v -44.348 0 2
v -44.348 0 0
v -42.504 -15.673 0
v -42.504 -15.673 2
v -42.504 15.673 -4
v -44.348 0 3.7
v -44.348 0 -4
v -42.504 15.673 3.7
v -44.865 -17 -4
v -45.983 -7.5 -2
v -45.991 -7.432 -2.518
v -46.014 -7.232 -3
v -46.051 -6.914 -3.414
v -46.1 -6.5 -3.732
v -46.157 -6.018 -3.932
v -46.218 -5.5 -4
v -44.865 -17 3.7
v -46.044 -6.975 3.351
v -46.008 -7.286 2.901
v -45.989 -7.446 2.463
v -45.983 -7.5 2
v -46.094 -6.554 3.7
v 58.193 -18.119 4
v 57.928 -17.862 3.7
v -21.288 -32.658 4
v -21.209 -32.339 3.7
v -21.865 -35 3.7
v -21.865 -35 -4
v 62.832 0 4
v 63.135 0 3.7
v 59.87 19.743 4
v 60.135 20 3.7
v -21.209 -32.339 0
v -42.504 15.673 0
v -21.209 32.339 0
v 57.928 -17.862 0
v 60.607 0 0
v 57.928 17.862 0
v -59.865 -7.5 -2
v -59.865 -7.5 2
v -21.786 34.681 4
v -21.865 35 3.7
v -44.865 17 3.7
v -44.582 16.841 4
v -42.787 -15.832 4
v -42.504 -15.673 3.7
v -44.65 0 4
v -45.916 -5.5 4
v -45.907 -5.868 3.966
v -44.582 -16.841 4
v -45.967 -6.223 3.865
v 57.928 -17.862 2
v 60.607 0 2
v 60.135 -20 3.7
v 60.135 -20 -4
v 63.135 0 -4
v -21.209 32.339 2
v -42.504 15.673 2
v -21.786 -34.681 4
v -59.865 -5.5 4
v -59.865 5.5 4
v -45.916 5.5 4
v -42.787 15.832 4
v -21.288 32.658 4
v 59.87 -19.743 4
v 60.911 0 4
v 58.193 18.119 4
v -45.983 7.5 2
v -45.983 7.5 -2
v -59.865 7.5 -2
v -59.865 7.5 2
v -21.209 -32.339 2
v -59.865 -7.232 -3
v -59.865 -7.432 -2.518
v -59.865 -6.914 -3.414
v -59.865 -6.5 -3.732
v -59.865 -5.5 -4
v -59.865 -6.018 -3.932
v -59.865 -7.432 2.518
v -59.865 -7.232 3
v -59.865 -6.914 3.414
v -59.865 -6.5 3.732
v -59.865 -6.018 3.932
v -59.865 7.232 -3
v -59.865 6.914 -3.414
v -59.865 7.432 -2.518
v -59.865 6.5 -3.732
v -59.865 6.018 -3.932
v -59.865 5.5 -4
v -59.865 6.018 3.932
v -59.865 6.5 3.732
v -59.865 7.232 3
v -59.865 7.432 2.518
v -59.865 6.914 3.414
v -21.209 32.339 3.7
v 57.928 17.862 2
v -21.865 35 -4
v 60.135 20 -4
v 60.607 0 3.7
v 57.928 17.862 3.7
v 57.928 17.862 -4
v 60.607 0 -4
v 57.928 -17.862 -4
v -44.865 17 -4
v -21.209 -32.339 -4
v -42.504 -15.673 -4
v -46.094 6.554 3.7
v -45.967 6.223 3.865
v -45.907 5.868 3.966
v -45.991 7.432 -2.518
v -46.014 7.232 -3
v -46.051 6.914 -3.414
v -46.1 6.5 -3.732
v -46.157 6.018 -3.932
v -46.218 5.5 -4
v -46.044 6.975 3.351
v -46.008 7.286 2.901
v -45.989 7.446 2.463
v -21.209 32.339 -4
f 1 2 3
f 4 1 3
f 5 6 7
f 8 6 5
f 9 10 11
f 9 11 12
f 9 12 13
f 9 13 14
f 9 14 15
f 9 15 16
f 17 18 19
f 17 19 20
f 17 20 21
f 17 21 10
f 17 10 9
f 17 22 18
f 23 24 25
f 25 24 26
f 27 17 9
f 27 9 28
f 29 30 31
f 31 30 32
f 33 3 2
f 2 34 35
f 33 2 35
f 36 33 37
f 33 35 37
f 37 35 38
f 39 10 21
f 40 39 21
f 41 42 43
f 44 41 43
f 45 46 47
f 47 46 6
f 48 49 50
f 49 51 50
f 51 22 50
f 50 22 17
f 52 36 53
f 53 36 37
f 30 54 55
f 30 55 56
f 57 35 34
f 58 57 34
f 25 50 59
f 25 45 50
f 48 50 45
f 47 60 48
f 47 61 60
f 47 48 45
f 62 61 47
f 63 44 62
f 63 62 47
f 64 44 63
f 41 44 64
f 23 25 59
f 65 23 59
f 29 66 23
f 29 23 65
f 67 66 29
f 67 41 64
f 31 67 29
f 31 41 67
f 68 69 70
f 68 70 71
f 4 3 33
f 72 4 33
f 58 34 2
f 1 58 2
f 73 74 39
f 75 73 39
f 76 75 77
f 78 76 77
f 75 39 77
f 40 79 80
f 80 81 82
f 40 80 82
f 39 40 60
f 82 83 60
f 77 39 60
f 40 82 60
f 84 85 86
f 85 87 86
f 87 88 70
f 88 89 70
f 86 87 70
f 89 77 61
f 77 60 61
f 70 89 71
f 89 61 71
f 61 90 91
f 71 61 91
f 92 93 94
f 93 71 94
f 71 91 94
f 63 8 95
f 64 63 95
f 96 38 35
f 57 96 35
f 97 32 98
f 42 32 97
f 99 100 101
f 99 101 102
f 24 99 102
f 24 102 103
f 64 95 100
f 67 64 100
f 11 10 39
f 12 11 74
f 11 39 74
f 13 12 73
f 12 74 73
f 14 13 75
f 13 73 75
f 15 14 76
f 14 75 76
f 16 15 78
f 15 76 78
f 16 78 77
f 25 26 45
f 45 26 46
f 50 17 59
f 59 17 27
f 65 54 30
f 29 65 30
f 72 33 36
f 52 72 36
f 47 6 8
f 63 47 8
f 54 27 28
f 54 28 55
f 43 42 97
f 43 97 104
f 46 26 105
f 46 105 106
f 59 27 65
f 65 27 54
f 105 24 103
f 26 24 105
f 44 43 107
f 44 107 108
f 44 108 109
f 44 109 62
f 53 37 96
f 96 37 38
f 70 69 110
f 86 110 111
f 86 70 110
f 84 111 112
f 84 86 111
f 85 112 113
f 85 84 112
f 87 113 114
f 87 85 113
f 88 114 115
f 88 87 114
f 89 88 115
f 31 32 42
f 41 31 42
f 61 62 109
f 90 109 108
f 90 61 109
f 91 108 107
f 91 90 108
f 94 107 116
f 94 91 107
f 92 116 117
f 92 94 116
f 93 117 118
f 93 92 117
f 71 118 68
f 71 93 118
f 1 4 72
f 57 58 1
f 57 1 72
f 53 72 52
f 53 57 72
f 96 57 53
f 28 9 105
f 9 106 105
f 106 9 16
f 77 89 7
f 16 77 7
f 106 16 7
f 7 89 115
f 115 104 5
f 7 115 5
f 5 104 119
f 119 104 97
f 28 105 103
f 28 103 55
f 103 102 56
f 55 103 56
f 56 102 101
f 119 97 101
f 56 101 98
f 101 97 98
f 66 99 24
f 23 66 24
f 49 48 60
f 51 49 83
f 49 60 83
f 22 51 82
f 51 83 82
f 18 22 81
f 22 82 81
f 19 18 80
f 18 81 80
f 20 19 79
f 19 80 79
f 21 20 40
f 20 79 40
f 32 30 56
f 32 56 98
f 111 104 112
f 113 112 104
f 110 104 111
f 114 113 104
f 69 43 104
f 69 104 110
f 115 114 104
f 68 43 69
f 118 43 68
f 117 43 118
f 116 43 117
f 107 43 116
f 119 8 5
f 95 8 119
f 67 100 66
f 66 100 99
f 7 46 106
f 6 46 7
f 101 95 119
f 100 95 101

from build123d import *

# Parameters (mm, degrees)
F1_DEPTH = 4
F2_DEPTH = 2
F5_W     = 15
F5_H     = 8
F6_DEPTH = 15
F7_R     = 2
F8_SIZE  = 0.3


with BuildPart() as f1:
    # F0 (on Top) → F1 (new body, symmetric)
    with BuildSketch(Plane.XY):
        Polygon((-44.8648623007, 17), (-46.8648623007, 0), (-44.8648623007, -17), (-21.8648623007, -35), (60.1351376993, -20), (63.1351376993, 0), (60.1351376993, 20), (-21.8648623007, 35), align=None)
        Polygon((-42.5037055669, -15.6732787773), (-44.3476207171, 0), (-42.5037055669, 15.6732787773), (-21.2091646129, 32.3385716978), (57.9278251858, 17.8622930761), (60.6071691472, 0), (57.9278251858, -17.8622930761), (-21.2091646129, -32.3385716978), align=None, mode=Mode.SUBTRACT)
    extrude(amount=F1_DEPTH, both=True)

    # F5 (on plane+point) → F6 (join)
    with BuildSketch(Plane.YZ.offset(-44.8648623007)):
        Rectangle(F5_W, F5_H)
    extrude(amount=-F6_DEPTH)

    # F7
    f7_edges = [f1.edges().sort_by_distance(p)[0] for p in [
        (-52.923686, -7.5, -4),
        (-52.923686, -7.5, 4),
        (-52.923686, 7.5, -4),
        (-52.923686, 7.5, 4),
    ]]
    fillet(f7_edges, radius=F7_R)

    # F8
    f8_edges = [f1.edges().sort_by_distance(p)[0] for p in [
        (-33.364862, -26, 4),
        (19.135138, -27.5, 4),
        (-45.423686, -12.25, 4),
        (-45.423686, 12.25, 4),
        (-33.364862, 26, 4),
        (19.135138, 27.5, 4),
        (61.635138, 10, 4),
        (61.635138, -10, 4),
        (-31.856435, -24.005925, 4),
        (-43.425663, -7.836639, 4),
        (-43.425663, 7.836639, 4),
        (-31.856435, 24.005925, 4),
        (18.35933, 25.100432, 4),
        (18.35933, -25.100432, 4),
        (59.267497, -8.931147, 4),
        (59.267497, 8.931147, 4),
    ]]
    chamfer(f8_edges, length=F8_SIZE)


with BuildPart() as f2:
    # F0 (on Top) → F2 (new body)
    with BuildSketch(Plane.XY):
        Polygon((-42.5037055669, 15.6732787773), (-44.3476207171, 0), (-42.5037055669, -15.6732787773), (-21.2091646129, -32.3385716978), (57.9278251858, -17.8622930761), (60.6071691472, 0), (57.9278251858, 17.8622930761), (-21.2091646129, 32.3385716978), align=None)
    extrude(amount=F2_DEPTH)


solid = Compound([f1.part, f2.part])
